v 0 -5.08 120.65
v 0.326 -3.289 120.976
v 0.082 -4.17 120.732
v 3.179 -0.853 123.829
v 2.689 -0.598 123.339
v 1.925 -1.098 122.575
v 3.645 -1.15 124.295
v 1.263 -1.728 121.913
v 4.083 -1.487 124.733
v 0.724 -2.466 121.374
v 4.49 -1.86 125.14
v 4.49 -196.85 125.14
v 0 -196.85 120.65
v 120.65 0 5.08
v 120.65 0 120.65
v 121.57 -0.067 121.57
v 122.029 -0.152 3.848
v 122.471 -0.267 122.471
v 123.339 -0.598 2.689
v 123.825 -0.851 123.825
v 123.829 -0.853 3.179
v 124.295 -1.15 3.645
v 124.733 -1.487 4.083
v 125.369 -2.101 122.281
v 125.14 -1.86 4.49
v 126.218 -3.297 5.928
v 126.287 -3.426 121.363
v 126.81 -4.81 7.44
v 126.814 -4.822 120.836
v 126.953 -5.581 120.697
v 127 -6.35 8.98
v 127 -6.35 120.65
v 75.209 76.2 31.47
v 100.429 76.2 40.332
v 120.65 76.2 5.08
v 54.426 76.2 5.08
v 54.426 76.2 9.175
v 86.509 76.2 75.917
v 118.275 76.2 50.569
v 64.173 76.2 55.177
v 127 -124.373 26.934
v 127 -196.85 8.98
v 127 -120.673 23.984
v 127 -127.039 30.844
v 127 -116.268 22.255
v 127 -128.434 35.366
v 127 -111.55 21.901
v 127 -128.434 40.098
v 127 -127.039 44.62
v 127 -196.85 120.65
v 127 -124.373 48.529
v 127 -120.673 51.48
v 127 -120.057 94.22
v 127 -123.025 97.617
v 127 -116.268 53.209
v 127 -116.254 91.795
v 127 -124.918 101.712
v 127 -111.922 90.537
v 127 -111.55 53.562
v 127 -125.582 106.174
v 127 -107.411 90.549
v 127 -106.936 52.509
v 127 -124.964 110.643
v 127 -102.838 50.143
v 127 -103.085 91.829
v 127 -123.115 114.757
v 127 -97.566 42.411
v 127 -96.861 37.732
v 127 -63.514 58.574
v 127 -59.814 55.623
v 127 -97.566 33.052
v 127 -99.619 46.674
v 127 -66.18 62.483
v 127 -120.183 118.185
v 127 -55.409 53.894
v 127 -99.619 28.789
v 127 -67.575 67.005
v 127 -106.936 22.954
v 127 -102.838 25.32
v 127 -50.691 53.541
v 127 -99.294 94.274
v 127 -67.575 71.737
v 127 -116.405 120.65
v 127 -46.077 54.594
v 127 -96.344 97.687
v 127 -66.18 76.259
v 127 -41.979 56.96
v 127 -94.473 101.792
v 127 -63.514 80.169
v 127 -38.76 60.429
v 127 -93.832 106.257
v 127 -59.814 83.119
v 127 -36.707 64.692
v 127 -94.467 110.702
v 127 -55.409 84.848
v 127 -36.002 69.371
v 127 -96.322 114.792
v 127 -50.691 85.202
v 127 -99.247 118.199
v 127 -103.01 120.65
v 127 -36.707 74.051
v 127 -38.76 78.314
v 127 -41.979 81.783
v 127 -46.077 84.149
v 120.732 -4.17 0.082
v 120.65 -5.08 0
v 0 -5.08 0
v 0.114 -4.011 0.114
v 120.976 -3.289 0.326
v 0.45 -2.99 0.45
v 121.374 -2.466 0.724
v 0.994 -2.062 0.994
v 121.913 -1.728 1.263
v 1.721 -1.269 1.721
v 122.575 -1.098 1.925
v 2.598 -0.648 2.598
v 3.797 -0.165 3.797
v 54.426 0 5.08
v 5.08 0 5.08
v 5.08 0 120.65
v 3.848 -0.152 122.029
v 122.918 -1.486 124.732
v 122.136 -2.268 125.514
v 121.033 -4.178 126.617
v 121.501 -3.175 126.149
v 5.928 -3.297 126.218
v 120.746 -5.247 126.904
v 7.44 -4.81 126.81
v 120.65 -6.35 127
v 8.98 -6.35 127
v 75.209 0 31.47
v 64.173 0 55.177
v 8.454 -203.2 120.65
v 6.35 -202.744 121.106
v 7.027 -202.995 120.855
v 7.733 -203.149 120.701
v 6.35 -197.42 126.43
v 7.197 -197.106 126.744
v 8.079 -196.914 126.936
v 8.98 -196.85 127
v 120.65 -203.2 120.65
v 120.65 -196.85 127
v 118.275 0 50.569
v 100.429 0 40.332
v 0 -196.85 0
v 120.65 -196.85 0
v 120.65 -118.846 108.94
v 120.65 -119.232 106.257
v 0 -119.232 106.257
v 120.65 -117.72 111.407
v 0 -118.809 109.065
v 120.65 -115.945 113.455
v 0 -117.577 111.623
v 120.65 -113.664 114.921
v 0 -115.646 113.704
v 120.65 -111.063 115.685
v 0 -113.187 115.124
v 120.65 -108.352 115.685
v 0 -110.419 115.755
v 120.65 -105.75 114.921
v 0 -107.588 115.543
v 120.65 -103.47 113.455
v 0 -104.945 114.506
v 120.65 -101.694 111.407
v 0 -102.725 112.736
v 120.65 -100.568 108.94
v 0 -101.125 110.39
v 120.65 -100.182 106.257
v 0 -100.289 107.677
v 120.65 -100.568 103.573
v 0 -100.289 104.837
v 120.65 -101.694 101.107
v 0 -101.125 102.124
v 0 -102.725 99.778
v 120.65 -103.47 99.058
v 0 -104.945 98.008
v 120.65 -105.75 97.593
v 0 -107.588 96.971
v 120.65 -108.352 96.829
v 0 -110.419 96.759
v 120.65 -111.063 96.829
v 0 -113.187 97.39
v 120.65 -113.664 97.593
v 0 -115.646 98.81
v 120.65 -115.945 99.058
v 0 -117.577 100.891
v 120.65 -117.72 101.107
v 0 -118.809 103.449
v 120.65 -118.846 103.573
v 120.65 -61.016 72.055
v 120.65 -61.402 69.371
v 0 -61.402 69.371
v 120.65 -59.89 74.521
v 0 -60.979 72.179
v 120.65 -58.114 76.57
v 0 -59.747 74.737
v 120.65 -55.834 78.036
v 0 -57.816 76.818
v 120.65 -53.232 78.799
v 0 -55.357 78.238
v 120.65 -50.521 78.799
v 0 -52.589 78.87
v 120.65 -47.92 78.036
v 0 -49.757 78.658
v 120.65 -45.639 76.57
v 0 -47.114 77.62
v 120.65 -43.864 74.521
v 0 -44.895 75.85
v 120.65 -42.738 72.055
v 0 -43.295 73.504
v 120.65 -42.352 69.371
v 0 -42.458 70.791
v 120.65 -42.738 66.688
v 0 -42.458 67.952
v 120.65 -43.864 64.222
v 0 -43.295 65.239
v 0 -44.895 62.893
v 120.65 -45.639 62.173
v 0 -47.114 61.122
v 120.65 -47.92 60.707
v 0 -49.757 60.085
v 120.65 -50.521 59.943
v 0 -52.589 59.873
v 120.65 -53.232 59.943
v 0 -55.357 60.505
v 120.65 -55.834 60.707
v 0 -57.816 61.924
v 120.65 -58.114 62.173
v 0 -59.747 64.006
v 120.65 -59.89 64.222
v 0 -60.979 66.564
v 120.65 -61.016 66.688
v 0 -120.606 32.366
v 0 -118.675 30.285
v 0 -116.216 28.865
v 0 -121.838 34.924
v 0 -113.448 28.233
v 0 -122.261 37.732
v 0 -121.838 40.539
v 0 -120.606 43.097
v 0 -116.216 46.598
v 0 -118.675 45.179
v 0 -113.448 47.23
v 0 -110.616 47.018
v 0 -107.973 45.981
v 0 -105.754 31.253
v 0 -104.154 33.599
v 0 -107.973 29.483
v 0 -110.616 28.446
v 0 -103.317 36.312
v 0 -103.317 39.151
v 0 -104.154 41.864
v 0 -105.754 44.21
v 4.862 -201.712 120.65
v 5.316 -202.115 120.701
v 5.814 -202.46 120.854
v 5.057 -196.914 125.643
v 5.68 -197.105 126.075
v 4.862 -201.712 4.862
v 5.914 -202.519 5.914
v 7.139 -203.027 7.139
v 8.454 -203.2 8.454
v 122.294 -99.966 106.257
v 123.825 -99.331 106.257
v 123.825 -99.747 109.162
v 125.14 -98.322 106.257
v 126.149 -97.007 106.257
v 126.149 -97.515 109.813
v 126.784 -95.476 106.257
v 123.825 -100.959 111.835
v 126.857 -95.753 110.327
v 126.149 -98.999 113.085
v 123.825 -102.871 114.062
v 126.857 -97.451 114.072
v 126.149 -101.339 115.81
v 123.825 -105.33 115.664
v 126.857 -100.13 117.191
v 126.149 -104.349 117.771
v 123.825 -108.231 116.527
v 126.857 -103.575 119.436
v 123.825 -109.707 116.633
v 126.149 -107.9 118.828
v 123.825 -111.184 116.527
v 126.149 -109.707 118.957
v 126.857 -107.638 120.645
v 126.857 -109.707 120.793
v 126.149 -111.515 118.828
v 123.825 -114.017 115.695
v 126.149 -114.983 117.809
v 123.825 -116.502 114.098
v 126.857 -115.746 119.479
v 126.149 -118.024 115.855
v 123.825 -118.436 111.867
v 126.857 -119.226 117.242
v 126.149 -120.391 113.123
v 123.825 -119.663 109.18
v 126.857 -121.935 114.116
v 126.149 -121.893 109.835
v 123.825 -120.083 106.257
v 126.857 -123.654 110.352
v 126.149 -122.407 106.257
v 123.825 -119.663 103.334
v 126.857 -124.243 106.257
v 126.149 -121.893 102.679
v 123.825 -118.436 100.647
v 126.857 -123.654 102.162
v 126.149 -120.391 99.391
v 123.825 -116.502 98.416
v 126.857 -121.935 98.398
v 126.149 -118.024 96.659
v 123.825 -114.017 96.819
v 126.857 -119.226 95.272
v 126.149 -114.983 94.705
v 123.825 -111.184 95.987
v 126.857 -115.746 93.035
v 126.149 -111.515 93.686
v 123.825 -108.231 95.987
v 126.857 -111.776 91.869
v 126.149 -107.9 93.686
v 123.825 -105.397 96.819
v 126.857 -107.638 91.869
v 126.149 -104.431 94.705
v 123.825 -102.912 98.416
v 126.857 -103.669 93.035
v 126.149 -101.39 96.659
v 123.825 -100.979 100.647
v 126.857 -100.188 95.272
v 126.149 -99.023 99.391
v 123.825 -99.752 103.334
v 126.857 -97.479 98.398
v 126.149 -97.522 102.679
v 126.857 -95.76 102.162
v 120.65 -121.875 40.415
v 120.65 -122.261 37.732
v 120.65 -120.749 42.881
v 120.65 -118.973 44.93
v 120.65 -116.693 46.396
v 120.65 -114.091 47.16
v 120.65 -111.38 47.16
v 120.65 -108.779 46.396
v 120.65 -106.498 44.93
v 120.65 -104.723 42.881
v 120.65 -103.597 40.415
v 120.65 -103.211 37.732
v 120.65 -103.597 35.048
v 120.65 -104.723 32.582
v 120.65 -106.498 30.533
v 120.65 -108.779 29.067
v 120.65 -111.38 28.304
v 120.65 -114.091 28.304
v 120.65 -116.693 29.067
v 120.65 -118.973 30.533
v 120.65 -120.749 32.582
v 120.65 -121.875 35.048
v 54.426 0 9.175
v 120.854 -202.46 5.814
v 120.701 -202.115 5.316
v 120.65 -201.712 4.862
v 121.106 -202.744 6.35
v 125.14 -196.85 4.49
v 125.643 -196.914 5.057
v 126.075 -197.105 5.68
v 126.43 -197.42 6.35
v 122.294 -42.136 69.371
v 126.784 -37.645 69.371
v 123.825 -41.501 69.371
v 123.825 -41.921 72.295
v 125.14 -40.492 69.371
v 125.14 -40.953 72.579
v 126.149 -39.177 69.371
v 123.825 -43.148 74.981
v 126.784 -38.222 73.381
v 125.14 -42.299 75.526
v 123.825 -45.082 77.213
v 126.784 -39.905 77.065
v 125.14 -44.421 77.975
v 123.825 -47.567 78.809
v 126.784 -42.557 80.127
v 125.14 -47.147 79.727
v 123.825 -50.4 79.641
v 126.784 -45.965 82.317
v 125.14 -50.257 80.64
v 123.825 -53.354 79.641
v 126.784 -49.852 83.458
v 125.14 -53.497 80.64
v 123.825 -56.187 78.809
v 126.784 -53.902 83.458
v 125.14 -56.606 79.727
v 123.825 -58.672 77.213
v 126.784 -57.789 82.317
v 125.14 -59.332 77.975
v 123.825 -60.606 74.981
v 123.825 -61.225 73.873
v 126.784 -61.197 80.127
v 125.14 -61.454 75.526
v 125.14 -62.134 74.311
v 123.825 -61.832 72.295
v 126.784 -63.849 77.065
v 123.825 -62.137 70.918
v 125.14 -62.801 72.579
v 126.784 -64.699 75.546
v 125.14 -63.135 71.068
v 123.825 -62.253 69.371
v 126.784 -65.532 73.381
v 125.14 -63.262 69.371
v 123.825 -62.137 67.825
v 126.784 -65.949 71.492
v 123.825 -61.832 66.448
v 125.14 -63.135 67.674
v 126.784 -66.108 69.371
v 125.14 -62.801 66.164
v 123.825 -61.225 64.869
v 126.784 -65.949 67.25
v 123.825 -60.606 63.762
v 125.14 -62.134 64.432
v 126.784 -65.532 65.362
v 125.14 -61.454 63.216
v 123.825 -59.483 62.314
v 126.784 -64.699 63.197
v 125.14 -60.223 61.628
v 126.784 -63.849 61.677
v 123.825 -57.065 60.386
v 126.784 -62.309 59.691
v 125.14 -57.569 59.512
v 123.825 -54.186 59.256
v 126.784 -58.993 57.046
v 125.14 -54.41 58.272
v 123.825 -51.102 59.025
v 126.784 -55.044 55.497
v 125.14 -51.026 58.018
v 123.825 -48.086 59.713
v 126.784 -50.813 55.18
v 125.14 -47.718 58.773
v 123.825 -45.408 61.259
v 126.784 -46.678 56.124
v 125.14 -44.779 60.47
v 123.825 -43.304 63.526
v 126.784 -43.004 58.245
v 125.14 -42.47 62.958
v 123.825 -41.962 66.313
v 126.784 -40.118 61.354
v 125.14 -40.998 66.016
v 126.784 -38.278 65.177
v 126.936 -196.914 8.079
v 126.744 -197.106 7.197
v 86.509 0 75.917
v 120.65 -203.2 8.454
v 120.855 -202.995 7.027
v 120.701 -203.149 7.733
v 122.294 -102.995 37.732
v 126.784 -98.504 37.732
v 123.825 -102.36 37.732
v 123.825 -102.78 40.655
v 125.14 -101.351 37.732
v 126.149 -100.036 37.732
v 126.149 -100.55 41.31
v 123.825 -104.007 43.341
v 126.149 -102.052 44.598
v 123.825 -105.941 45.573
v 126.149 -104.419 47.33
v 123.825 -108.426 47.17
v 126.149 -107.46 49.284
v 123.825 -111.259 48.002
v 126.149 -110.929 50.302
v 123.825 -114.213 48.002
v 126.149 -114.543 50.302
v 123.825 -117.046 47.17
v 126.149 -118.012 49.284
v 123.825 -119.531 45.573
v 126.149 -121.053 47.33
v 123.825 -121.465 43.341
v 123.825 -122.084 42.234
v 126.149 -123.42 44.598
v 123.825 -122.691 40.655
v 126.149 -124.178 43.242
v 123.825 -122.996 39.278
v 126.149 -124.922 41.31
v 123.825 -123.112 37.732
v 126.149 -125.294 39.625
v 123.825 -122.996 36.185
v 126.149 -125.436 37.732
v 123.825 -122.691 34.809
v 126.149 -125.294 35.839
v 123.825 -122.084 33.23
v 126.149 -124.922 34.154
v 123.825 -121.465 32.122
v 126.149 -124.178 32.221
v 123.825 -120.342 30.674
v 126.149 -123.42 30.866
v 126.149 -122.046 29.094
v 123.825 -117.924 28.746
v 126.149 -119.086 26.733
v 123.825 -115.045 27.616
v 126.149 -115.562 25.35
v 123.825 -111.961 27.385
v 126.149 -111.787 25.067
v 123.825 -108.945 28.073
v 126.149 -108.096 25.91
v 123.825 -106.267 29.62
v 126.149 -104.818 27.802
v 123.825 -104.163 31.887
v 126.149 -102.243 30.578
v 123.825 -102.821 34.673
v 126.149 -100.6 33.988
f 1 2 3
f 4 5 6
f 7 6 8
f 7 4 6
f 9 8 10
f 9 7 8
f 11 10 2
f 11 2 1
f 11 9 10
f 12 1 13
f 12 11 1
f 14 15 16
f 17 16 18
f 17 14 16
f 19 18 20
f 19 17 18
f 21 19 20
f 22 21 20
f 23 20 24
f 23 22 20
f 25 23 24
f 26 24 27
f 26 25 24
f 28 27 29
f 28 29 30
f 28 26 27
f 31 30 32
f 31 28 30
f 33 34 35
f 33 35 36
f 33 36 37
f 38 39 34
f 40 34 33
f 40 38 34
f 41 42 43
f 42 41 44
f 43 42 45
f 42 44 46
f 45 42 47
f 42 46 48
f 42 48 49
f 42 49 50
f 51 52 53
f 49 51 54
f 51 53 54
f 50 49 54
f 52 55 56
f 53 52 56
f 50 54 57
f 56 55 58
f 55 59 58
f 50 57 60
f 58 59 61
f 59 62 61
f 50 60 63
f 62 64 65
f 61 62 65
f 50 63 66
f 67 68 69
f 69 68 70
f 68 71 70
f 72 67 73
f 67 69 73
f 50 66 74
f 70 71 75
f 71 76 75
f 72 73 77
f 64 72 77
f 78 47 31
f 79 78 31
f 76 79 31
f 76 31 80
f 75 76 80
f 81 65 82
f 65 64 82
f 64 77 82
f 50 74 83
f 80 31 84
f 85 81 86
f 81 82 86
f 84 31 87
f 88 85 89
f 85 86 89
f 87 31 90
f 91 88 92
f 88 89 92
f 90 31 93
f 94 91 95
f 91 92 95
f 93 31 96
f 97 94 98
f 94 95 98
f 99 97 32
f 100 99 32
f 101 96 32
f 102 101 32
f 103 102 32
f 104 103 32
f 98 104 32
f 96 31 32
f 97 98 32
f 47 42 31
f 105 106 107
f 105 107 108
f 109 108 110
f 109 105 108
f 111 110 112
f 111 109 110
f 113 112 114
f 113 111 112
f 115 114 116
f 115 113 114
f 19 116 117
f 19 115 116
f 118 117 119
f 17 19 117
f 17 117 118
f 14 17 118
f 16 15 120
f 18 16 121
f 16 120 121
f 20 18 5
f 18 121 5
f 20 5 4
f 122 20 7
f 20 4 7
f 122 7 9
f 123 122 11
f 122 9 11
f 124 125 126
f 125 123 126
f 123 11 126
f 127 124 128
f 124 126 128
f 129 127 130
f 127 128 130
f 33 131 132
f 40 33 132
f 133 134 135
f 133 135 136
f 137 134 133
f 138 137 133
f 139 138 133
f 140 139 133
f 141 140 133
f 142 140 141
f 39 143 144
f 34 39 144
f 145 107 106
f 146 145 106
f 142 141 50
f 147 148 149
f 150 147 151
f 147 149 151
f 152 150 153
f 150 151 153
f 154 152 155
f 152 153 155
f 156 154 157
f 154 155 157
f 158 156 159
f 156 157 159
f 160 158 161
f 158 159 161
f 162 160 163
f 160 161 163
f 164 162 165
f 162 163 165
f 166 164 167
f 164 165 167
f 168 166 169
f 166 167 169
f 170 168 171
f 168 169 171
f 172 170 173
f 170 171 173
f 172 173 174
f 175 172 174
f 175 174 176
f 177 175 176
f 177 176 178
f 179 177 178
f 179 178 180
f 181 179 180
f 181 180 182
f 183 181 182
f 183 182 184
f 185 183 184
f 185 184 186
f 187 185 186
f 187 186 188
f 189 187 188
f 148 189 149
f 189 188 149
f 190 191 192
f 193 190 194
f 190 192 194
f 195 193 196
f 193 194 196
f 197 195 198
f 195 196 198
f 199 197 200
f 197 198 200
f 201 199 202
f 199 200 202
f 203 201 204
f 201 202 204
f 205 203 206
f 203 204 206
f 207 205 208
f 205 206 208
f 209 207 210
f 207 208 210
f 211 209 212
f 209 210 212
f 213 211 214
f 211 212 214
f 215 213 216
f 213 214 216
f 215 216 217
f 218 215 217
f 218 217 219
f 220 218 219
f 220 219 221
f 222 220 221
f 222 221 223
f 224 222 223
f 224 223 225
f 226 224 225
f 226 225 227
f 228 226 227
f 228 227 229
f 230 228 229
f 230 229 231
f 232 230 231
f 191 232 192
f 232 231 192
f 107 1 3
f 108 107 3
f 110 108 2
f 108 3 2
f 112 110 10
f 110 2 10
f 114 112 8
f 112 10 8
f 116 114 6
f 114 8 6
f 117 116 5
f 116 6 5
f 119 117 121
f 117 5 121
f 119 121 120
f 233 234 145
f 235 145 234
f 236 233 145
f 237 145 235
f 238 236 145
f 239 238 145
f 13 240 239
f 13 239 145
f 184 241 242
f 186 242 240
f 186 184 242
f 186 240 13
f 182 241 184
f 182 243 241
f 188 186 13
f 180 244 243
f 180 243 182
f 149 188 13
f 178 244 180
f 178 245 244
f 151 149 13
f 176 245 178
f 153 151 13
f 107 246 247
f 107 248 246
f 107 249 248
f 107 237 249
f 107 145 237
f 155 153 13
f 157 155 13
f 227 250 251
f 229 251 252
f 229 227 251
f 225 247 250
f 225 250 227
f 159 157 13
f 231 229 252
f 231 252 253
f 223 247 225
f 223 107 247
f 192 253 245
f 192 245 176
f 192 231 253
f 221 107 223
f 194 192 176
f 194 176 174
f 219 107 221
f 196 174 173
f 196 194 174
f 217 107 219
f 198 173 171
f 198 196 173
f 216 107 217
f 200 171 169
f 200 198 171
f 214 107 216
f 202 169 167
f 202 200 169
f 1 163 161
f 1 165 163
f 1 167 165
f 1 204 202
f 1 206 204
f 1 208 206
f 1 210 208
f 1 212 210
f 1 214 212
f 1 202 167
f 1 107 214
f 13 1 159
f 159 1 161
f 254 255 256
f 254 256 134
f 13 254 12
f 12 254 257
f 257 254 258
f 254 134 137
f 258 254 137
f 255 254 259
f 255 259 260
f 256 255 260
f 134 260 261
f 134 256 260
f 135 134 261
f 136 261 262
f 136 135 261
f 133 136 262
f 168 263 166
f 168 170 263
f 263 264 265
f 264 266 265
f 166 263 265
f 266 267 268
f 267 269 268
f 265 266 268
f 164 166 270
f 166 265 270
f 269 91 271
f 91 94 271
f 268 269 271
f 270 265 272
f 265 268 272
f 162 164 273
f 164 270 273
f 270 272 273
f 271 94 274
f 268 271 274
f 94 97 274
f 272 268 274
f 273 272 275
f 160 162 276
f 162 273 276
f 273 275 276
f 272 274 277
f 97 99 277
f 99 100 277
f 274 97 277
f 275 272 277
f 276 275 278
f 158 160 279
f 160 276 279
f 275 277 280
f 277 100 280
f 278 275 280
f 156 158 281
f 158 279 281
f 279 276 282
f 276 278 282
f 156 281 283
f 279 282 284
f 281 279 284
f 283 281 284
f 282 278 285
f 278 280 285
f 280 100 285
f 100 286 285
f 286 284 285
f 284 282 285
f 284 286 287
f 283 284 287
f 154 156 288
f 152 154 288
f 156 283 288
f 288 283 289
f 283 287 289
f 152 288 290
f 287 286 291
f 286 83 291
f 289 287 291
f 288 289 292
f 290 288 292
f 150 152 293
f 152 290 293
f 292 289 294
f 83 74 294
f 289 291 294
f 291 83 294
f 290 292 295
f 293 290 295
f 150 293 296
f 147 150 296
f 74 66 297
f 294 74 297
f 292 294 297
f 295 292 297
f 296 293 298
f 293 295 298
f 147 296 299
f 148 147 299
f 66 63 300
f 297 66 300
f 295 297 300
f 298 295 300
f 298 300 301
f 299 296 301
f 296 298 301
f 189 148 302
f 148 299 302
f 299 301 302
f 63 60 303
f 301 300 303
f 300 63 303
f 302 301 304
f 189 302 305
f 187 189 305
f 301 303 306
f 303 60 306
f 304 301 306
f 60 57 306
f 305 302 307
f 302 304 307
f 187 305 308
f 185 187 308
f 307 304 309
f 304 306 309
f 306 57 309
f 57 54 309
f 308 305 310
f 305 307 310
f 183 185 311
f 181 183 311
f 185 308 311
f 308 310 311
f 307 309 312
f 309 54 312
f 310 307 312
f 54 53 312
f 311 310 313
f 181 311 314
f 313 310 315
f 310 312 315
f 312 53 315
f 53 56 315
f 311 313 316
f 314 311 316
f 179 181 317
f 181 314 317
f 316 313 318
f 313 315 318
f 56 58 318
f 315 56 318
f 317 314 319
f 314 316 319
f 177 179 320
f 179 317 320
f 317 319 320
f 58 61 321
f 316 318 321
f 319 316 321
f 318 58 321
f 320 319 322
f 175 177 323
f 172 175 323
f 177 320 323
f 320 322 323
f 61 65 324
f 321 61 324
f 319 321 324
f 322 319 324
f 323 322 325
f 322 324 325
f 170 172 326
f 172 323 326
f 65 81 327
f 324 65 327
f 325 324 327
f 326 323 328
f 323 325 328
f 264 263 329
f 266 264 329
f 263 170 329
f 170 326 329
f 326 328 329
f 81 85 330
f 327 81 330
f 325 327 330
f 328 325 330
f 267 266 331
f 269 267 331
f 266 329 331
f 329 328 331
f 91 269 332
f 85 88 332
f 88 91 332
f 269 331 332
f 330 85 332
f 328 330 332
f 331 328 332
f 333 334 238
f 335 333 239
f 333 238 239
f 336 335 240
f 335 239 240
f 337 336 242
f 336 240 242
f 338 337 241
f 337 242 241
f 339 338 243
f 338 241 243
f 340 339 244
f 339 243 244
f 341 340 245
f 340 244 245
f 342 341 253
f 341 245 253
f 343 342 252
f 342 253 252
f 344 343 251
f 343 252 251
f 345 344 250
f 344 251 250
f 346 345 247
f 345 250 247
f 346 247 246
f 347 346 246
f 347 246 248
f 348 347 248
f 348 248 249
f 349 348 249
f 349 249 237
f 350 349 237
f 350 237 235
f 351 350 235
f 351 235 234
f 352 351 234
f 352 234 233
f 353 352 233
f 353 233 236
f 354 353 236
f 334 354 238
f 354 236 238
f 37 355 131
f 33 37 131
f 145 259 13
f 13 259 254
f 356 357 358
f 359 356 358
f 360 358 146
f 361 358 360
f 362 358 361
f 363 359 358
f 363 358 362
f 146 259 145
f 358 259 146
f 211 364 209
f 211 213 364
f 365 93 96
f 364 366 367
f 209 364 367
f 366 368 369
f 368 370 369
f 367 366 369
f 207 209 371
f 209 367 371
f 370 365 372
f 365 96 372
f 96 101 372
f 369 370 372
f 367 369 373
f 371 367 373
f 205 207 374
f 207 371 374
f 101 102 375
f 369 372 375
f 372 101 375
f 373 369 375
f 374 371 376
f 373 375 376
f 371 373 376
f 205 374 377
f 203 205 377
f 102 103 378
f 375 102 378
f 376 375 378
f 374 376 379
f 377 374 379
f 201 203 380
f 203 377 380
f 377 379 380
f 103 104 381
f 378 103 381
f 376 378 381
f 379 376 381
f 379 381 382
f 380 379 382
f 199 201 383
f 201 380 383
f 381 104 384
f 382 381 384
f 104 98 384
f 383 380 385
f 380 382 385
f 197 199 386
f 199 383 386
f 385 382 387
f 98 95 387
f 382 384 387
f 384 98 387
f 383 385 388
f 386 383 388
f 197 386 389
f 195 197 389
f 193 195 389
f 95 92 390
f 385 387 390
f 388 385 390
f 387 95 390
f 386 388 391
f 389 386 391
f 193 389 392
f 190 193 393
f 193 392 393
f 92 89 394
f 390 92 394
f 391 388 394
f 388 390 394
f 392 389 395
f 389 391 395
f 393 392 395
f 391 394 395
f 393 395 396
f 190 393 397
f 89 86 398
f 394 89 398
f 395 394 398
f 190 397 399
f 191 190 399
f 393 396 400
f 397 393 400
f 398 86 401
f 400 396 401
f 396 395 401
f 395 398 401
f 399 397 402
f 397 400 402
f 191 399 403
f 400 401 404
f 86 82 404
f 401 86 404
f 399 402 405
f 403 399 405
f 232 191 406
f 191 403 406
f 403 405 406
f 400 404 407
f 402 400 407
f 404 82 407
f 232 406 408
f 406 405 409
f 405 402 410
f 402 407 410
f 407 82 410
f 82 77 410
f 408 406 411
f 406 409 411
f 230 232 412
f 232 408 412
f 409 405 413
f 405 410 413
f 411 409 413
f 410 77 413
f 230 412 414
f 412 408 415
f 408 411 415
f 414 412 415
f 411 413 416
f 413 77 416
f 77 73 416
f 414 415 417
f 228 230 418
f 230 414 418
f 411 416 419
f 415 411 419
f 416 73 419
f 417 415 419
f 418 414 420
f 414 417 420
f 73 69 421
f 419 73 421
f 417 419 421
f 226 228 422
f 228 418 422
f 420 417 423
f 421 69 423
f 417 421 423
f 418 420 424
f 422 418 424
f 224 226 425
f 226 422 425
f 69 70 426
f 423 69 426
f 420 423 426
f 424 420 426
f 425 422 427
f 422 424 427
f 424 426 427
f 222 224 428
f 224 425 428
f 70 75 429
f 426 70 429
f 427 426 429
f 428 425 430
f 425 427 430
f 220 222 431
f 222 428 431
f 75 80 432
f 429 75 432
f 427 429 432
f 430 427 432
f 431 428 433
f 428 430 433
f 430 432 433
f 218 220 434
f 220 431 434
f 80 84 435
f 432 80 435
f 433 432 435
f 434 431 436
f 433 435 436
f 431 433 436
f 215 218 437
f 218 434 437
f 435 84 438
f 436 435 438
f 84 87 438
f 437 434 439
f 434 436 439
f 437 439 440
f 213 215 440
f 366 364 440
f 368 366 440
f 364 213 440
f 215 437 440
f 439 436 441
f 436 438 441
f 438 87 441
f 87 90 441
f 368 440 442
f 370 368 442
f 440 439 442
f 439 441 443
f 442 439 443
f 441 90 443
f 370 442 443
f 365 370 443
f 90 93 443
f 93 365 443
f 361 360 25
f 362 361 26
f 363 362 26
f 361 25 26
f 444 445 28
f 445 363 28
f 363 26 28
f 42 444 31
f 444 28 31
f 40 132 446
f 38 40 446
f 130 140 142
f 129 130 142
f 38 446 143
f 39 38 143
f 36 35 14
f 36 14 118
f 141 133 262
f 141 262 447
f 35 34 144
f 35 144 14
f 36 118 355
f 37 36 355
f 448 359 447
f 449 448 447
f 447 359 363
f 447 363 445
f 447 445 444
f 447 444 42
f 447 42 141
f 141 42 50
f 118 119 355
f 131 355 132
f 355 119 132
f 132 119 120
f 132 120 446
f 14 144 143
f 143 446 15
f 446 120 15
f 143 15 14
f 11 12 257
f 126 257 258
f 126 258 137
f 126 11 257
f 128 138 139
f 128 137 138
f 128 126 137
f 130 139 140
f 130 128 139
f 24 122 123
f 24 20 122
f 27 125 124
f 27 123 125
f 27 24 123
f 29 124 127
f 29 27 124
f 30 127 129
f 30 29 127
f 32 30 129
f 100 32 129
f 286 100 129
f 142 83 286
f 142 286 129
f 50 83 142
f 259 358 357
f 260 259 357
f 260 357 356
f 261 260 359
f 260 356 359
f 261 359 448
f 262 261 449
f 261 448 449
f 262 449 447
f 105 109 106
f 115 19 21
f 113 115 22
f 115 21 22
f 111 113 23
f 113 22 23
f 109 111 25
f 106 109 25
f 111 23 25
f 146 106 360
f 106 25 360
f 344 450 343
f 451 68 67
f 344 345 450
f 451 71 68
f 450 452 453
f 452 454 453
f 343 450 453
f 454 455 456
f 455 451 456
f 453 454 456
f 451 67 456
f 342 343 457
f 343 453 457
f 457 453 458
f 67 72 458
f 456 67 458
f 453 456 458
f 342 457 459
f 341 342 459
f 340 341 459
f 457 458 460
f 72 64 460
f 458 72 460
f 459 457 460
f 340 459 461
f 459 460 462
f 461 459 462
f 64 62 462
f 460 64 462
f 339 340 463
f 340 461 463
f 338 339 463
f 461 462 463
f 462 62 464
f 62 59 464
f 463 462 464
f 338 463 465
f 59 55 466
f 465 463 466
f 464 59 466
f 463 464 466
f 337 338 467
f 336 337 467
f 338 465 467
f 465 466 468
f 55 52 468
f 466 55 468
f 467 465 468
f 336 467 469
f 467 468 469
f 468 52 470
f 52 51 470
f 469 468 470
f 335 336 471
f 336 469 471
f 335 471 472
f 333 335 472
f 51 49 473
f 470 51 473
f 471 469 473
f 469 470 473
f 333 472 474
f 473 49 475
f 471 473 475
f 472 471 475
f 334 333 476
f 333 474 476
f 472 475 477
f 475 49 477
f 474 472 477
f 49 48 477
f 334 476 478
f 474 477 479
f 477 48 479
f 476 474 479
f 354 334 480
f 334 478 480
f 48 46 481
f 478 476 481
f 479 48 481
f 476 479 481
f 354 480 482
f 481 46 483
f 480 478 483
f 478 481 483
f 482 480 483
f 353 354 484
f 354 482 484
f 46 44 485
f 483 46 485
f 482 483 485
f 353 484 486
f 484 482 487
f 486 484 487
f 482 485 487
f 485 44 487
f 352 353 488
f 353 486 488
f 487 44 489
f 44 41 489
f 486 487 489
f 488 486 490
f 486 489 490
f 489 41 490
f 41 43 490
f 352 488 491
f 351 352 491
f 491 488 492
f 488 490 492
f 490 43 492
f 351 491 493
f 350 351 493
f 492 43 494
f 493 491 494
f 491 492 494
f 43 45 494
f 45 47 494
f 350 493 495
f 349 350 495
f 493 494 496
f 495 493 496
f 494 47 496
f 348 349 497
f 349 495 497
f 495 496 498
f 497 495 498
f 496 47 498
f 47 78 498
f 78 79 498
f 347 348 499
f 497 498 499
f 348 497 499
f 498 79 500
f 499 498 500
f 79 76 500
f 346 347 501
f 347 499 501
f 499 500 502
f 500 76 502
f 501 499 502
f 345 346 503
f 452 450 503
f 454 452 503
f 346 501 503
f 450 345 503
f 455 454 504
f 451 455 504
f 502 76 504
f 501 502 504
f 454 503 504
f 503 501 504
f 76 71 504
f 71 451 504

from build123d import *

# Parameters (mm, degrees)
F0_W        = 127
F0_H        = 127
F1_DEPTH    = 203.2
F3_D        = 19.05
F4_SIZE     = 6.35
F5_T1_DEPTH = 210.0012806053
F5_T3_DEPTH = 146.05
F5_T5_DEPTH = 146.05
F6_R        = 5.08
F7_R        = 5.08
F9_DEPTH    = 76.2


# Not quite as in the source:
# - a fillet or chamfer that OpenCascade refuses, or shapes differently, is made with other operations: its cross-section is extruded or revolved along the edge and cut away or added


with BuildPart() as f1:
    # F0 (on Front) → F1 (new body)
    with BuildSketch(Plane.XZ):
        with Locations((63.5, 63.5)):
            Rectangle(F0_W, F0_H)
    extrude(amount=F1_DEPTH)

    # F3 (through all)
    with Locations(Plane.YZ.offset(127)):
        with Locations((-109.707146883, 106.2569767237), (-51.8769121036, 69.3713248935), (-112.7359410134, 37.7316983828)):
            Hole(F3_D / 2)

    # F4
    f4_edges = [f1.edges().sort_by_distance(p)[0] for p in [
        (63.5, -203.2, 127),
        (0, -203.2, 63.5),
        (127, -203.2, 63.5),
        (63.5, -203.2, 0),
        (127, -101.6, 0),
        (127, -101.6, 127),
        (0, -101.6, 127),
    ]]
    chamfer(f4_edges, length=F4_SIZE)

    # F5: fillet of radius 6.35 on 7 edges, made by hand

    # F5_s2 → F5_t1 (cut)
    with BuildSketch(Plane.XZ.offset(-6.5756403027)):
        with BuildLine():
            ThreePointArc((4.4901280605, 125.1401280605), (6.5502163256, 126.5166350314), (8.9802561211, 127))
            Line((8.9802561211, 127), (6.35, 127))
            Line((6.35, 127), (4.4901280605, 125.1401280605))
        make_face()
        with BuildLine():
            ThreePointArc((125.1401280605, 4.4901280605), (126.5166350314, 6.5502163256), (127, 8.9802561211))
            Line((127, 8.9802561211), (127, 6.35))
            Line((127, 6.35), (125.1401280605, 4.4901280605))
        make_face()
    extrude(amount=F5_T1_DEPTH, mode=Mode.SUBTRACT)

    # F5_s4 → F5_t3 (cut)
    with BuildSketch(Plane.YZ.offset(-9.525)):
        with BuildLine():
            ThreePointArc((0, 120.65), (-1.8598719395, 125.1401280605), (-6.35, 127))
            Line((-6.35, 127), (0, 127))
            Line((0, 127), (0, 120.65))
        make_face()
    extrude(amount=F5_T3_DEPTH, mode=Mode.SUBTRACT)

    # F5_s6 → F5_t5 (cut)
    with BuildSketch(Plane.XY.offset(-9.525)):
        with BuildLine():
            ThreePointArc((120.65, 0), (125.1401280605, -1.8598719395), (127, -6.35))
            Line((127, -6.35), (127, 0))
            Line((127, 0), (120.65, 0))
        make_face()
    extrude(amount=F5_T5_DEPTH, mode=Mode.SUBTRACT)

    # F5_s7 → F5_t8 (revolve, cut)
    with BuildSketch(Plane.XY.offset(106.2569767237)):
        with BuildLine():
            ThreePointArc((120.65, -100.182146883), (125.1401280605, -98.3222749435), (127, -93.832146883))
            Line((127, -93.832146883), (127, -100.182146883))
            Line((127, -100.182146883), (120.65, -100.182146883))
        make_face()
    revolve(axis=Axis((127, -109.707146883, 106.2569767237), (1, 0, 0)), mode=Mode.SUBTRACT)

    # F5_s9 → F5_t10 (revolve, cut)
    with BuildSketch(Plane.XY.offset(37.7316983828)):
        with BuildLine():
            ThreePointArc((120.65, -103.2109410134), (125.1401280605, -101.3510690739), (127, -96.8609410134))
            Line((127, -96.8609410134), (127, -103.2109410134))
            Line((127, -103.2109410134), (120.65, -103.2109410134))
        make_face()
    revolve(axis=Axis((127, -112.7359410134, 37.7316983828), (1, 0, 0)), mode=Mode.SUBTRACT)

    # F5_s11 → F5_t12 (revolve, cut)
    with BuildSketch(Plane.XY.offset(69.3713248935)):
        with BuildLine():
            ThreePointArc((120.65, -42.3519121036), (125.1401280605, -40.4920401641), (127, -36.0019121036))
            Line((127, -36.0019121036), (127, -42.3519121036))
            Line((127, -42.3519121036), (120.65, -42.3519121036))
        make_face()
    revolve(axis=Axis((127, -51.8769121036, 69.3713248935), (1, 0, 0)), mode=Mode.SUBTRACT)

    # F6
    f6_edges = [f1.edges().sort_by_distance(p)[0] for p in [
        (6.35, -203.2, 63.5),
        (63.5, -203.2, 6.35),
    ]]
    fillet(f6_edges, radius=F6_R)

    # F7
    f7_edges = [f1.edges().sort_by_distance(p)[0] for p in [
        (60.325, 0, 0),
        (0, 0, 60.325),
    ]]
    fillet(f7_edges, radius=F7_R)

    # F8 (on face) → F9 (join)
    with BuildSketch(Plane(origin=(0, 0, 0), x_dir=(-1, 0, 0), z_dir=(0, 1, 0))):
        Polygon((-100.4286549397, 40.3320468052), (-120.65, 5.08), (-54.4255593013, 5.08), (-54.4255593013, 9.1751408411), (-75.2091502909, 31.4702691336), (-64.1732869808, 55.1769325335), (-86.5088332529, 75.9170813451), (-118.2750036349, 50.5691027419), align=None)
    extrude(amount=F9_DEPTH)


solid = f1.part
